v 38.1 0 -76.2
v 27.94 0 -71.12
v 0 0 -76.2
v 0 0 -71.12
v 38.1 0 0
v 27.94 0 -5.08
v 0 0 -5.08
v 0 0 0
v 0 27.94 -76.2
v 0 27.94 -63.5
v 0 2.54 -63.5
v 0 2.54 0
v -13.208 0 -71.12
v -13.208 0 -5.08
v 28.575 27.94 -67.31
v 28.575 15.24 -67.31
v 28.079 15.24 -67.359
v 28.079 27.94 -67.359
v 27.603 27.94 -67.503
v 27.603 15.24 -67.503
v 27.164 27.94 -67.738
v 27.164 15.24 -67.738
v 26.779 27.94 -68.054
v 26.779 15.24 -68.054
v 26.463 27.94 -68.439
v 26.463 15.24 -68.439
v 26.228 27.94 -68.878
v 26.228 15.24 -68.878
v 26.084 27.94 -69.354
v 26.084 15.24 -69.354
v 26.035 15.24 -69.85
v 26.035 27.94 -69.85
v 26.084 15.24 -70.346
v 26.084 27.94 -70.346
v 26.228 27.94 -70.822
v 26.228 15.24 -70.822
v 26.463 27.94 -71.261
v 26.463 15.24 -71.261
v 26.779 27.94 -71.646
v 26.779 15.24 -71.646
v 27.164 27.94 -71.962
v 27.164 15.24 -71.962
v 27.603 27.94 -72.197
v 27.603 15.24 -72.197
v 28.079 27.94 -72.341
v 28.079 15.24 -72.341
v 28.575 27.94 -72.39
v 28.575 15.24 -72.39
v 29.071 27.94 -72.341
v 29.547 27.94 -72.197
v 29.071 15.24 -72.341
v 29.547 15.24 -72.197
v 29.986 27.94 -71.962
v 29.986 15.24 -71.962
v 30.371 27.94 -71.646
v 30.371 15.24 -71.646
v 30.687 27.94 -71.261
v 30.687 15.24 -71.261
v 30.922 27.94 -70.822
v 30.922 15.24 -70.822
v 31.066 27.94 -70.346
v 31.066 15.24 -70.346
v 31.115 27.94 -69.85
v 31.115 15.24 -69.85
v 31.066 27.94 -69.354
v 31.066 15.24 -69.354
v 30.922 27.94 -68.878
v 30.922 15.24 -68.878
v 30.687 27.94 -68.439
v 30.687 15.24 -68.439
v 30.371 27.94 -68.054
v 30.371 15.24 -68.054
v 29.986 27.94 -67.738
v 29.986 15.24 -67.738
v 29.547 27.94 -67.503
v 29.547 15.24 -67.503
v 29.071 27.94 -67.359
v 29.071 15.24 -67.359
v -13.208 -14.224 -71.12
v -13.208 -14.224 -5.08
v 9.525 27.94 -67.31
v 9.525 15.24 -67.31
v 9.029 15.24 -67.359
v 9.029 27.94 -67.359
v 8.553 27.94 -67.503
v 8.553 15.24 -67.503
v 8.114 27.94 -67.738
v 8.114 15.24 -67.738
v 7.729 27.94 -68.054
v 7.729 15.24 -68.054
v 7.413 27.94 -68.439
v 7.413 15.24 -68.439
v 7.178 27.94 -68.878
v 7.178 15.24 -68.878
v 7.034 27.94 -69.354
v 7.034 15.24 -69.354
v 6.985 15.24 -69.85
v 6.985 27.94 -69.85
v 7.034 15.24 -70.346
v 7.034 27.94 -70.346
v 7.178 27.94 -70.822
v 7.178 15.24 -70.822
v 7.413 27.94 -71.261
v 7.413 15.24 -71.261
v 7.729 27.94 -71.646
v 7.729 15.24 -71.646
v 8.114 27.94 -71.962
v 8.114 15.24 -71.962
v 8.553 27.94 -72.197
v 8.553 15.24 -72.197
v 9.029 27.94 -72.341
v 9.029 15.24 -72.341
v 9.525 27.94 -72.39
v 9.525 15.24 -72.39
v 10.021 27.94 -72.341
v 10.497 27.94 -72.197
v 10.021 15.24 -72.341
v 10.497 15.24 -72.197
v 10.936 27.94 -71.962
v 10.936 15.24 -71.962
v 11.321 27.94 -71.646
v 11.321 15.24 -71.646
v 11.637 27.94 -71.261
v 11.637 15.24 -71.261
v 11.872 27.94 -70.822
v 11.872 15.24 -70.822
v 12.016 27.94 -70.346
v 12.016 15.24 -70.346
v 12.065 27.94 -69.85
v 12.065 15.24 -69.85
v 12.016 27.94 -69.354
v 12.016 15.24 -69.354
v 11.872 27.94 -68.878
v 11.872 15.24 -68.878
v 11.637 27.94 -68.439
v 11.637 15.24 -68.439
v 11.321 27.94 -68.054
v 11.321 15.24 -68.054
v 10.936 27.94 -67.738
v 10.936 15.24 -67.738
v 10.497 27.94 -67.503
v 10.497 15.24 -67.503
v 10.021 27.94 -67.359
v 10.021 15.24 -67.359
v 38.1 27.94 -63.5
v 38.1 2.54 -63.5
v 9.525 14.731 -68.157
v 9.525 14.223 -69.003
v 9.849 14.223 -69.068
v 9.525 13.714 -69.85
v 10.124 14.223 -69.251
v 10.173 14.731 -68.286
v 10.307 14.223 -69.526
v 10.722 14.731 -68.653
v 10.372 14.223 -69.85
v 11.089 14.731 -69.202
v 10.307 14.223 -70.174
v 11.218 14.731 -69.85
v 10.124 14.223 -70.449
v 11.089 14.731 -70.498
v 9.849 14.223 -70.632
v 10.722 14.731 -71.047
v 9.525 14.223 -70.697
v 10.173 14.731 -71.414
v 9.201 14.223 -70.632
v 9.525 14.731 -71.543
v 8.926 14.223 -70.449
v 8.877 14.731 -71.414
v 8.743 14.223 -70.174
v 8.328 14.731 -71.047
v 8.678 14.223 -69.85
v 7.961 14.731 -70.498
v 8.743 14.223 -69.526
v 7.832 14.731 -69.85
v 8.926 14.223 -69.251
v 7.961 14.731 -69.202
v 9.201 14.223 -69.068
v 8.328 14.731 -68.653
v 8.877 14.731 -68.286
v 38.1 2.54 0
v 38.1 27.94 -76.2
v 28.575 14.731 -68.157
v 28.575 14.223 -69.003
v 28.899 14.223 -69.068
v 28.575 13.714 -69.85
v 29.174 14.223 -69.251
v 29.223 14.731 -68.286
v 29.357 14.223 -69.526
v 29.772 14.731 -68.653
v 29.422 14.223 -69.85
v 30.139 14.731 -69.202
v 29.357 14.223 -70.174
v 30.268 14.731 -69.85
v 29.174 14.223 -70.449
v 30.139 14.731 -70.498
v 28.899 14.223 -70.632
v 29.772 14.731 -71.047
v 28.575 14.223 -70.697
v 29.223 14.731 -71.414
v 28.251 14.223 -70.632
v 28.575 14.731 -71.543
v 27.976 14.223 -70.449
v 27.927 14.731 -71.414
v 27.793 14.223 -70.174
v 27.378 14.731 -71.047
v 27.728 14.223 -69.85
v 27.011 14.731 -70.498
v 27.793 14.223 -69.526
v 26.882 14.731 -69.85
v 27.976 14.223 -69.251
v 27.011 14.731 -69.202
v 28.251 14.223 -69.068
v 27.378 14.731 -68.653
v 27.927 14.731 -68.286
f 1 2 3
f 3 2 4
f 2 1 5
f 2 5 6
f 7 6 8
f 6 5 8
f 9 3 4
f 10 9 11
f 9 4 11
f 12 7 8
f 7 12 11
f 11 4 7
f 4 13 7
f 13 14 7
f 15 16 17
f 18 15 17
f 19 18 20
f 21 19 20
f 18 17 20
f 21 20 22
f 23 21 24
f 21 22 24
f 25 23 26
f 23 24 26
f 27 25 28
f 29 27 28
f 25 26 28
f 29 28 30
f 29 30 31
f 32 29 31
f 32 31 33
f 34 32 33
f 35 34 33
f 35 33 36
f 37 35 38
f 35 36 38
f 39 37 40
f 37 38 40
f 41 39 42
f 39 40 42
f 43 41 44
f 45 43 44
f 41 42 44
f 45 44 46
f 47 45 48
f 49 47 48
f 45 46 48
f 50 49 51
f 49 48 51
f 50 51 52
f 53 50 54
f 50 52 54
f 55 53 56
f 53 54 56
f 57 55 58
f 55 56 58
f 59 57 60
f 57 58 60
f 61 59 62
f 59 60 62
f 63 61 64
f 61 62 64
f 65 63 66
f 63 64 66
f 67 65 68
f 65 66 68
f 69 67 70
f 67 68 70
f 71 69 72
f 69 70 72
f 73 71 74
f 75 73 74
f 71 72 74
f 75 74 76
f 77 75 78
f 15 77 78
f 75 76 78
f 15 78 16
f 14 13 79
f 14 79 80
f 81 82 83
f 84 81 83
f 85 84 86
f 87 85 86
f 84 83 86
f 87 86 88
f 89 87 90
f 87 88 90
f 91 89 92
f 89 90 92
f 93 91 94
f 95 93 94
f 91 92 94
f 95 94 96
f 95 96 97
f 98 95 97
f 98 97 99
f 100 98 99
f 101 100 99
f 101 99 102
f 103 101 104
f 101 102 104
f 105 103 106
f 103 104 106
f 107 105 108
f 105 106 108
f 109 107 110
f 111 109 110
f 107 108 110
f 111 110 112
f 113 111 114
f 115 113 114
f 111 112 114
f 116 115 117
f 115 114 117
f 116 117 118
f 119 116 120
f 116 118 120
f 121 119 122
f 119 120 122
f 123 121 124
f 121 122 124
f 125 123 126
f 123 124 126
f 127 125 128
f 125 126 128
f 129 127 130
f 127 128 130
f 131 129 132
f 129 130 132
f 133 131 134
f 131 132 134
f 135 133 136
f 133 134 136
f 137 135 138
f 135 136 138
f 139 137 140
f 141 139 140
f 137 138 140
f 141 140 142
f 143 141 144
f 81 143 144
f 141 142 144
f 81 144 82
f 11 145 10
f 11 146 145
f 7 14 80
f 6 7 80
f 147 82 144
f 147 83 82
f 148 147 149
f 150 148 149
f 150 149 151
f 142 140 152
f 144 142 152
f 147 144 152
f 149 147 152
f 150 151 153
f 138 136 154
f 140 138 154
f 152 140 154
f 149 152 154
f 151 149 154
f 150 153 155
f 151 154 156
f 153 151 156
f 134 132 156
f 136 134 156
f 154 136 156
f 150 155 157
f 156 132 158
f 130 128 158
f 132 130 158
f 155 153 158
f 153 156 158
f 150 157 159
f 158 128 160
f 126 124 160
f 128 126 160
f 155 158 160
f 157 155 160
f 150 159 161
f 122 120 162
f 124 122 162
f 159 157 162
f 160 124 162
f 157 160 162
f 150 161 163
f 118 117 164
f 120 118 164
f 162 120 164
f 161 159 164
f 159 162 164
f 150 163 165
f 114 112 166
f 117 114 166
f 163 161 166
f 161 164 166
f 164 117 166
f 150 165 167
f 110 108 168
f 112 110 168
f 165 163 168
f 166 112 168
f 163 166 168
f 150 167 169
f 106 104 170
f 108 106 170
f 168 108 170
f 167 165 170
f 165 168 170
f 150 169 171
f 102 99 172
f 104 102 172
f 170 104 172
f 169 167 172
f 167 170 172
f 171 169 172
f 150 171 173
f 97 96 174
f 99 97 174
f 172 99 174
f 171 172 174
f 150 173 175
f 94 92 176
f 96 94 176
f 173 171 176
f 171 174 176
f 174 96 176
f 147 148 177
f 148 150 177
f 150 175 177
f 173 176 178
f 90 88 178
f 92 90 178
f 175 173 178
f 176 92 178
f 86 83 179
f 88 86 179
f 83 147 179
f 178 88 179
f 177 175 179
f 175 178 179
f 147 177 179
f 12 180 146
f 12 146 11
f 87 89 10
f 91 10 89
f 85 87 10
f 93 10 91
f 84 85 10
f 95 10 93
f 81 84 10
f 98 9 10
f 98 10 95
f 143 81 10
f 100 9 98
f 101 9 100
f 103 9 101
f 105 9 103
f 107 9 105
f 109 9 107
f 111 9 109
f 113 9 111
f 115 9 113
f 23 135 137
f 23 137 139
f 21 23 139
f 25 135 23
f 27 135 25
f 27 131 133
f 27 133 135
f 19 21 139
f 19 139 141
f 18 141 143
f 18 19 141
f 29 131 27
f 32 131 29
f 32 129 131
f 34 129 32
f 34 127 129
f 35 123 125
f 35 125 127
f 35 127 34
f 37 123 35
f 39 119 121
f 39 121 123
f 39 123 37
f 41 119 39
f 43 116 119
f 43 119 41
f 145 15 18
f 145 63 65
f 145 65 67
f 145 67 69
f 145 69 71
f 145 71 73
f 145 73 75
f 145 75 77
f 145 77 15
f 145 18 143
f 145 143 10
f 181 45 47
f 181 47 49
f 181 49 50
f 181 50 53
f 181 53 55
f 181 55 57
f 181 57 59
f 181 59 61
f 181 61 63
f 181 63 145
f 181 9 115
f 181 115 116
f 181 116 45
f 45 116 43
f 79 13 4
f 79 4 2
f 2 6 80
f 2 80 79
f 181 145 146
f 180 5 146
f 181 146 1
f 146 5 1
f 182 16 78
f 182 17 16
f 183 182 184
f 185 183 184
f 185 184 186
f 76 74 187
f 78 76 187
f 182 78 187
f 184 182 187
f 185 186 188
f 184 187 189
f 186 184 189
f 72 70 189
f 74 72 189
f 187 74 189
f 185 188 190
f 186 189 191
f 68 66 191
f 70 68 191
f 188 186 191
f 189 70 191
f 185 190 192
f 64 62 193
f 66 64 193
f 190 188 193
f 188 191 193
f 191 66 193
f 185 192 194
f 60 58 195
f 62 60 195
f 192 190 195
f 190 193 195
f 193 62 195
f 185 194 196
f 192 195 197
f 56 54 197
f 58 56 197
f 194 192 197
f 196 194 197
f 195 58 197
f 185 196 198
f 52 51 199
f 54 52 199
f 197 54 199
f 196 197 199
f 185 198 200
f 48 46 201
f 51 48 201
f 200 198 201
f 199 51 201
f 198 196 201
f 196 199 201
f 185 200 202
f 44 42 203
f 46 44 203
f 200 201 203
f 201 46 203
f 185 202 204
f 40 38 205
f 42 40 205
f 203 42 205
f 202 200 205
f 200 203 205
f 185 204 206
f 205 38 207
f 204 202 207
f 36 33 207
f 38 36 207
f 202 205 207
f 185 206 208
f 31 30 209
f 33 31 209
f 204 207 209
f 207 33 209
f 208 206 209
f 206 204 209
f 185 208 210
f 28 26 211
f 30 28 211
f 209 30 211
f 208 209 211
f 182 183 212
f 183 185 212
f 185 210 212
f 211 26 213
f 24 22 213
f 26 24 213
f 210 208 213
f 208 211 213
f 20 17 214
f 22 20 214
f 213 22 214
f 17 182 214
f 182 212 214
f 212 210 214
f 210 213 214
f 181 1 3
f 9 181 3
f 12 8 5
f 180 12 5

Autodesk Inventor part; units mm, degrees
ref_plane "YZ Plane" through (0, 0, 0) normal (1, 0, 0) x (0, 1, 0)
ref_plane "XZ Plane" through (0, 0, 0) normal (0, 1, 0) x (-1, 0, 0)
ref_plane "XY Plane" through (0, 0, 0) normal (0, 0, 1) x (1, 0, 0)
sketch "Sketch1" plane through (0, 0, 0) normal (0, 1, 0) x (-1, 0, 0)
  line L0 (0, 0) -> (-38.1, 0)
  line L1 (-38.1, 0) -> (-38.1, -76.2)
  line L2 (-38.1, -76.2) -> (0, -76.2)
  line L3 (0, -76.2) -> (0, 0)
  dimension "d0" = 38.1
  dimension "d1" = 76.2
extrude "Extrusion1" add sketch "Sketch1" along normal blind 2.54
sketch "Sketch2" plane through (0, 2.54, 0) normal (0, 1, 0) x (1, 0, 0)
  line L0 (38.1, 76.2) -> (0, 76.2) projected
  line L1 (0, 76.2) -> (38.1, 76.2)
  line L2 (38.1, 76.2) -> (38.1, 63.5)
  line L3 (38.1, 63.5) -> (0, 63.5)
  line L4 (0, 63.5) -> (0, 76.2)
  point P0 (0, 0)
  dimension "d4" = 38.1
  dimension "d5" = 12.7
extrude "Extrusion2" add sketch "Sketch2" along normal blind 25.4
sketch "Sketch6" plane through (0, 27.94, 0) normal (0, 1, 0) x (1, 0, 0)
  line L0 (0, 76.2) -> (0, 63.5) projected
  line L1 (0, 69.85) -> (38.1, 69.85)
  line L2 (38.1, 63.5) -> (38.1, 76.2) projected
  line L3 (0, 69.85) -> (9.525, 69.85)
  line L4 (38.1, 69.85) -> (28.575, 69.85)
  point P0 (0, 0)
  dimension "d8" = 9.525
  dimension "d9" = 9.525
hole "Hole1" at (9.525, 27.94, -69.85) at (28.575, 27.94, -69.85) direction (0, -1, 0) diameter 5.08 depth 12.7 tip angle 118
sketch "Sketch7" plane through (0, 0, 0) normal (0, -1, 0) x (1, 0, 0)
  line L0 (38.1, 0) -> (38.1, -76.2) projected
  line L1 (38.1, -38.1) -> (27.94, -38.1)
  line L2 (38.1, -76.2) -> (0, -76.2) projected
  line L3 (19.05, -76.2) -> (19.05, -71.12)
  line L4 (0, 0) -> (38.1, 0) projected
  line L5 (19.05, 0) -> (19.05, -5.08)
  line L6 (19.05, -71.12) -> (38.1, -71.12)
  line L7 (27.94, -38.1) -> (27.94, -71.12)
  line L8 (27.94, -71.12) -> (-13.208, -71.12)
  line L9 (-13.208, -71.12) -> (-13.208, -5.08)
  line L10 (-13.208, -5.08) -> (27.94, -5.08)
  line L11 (27.94, -5.08) -> (27.94, -71.12)
  dimension "d23" = 10.16
  dimension "d24" = 5.08
  dimension "d25" = 5.08
  dimension "d26" = 41.148
extrude "Extrusion3" add sketch "Sketch7" along normal blind 14.224 contours L7 L6 L8 L9 L10 L11
chamfer "Chamfer3" distance 41.148 distance2 14.224 1 edges at (27.94, -14.224, -38.1) measured on face at (14.224, -14.224, -49.1067)
properties part number "Base"
